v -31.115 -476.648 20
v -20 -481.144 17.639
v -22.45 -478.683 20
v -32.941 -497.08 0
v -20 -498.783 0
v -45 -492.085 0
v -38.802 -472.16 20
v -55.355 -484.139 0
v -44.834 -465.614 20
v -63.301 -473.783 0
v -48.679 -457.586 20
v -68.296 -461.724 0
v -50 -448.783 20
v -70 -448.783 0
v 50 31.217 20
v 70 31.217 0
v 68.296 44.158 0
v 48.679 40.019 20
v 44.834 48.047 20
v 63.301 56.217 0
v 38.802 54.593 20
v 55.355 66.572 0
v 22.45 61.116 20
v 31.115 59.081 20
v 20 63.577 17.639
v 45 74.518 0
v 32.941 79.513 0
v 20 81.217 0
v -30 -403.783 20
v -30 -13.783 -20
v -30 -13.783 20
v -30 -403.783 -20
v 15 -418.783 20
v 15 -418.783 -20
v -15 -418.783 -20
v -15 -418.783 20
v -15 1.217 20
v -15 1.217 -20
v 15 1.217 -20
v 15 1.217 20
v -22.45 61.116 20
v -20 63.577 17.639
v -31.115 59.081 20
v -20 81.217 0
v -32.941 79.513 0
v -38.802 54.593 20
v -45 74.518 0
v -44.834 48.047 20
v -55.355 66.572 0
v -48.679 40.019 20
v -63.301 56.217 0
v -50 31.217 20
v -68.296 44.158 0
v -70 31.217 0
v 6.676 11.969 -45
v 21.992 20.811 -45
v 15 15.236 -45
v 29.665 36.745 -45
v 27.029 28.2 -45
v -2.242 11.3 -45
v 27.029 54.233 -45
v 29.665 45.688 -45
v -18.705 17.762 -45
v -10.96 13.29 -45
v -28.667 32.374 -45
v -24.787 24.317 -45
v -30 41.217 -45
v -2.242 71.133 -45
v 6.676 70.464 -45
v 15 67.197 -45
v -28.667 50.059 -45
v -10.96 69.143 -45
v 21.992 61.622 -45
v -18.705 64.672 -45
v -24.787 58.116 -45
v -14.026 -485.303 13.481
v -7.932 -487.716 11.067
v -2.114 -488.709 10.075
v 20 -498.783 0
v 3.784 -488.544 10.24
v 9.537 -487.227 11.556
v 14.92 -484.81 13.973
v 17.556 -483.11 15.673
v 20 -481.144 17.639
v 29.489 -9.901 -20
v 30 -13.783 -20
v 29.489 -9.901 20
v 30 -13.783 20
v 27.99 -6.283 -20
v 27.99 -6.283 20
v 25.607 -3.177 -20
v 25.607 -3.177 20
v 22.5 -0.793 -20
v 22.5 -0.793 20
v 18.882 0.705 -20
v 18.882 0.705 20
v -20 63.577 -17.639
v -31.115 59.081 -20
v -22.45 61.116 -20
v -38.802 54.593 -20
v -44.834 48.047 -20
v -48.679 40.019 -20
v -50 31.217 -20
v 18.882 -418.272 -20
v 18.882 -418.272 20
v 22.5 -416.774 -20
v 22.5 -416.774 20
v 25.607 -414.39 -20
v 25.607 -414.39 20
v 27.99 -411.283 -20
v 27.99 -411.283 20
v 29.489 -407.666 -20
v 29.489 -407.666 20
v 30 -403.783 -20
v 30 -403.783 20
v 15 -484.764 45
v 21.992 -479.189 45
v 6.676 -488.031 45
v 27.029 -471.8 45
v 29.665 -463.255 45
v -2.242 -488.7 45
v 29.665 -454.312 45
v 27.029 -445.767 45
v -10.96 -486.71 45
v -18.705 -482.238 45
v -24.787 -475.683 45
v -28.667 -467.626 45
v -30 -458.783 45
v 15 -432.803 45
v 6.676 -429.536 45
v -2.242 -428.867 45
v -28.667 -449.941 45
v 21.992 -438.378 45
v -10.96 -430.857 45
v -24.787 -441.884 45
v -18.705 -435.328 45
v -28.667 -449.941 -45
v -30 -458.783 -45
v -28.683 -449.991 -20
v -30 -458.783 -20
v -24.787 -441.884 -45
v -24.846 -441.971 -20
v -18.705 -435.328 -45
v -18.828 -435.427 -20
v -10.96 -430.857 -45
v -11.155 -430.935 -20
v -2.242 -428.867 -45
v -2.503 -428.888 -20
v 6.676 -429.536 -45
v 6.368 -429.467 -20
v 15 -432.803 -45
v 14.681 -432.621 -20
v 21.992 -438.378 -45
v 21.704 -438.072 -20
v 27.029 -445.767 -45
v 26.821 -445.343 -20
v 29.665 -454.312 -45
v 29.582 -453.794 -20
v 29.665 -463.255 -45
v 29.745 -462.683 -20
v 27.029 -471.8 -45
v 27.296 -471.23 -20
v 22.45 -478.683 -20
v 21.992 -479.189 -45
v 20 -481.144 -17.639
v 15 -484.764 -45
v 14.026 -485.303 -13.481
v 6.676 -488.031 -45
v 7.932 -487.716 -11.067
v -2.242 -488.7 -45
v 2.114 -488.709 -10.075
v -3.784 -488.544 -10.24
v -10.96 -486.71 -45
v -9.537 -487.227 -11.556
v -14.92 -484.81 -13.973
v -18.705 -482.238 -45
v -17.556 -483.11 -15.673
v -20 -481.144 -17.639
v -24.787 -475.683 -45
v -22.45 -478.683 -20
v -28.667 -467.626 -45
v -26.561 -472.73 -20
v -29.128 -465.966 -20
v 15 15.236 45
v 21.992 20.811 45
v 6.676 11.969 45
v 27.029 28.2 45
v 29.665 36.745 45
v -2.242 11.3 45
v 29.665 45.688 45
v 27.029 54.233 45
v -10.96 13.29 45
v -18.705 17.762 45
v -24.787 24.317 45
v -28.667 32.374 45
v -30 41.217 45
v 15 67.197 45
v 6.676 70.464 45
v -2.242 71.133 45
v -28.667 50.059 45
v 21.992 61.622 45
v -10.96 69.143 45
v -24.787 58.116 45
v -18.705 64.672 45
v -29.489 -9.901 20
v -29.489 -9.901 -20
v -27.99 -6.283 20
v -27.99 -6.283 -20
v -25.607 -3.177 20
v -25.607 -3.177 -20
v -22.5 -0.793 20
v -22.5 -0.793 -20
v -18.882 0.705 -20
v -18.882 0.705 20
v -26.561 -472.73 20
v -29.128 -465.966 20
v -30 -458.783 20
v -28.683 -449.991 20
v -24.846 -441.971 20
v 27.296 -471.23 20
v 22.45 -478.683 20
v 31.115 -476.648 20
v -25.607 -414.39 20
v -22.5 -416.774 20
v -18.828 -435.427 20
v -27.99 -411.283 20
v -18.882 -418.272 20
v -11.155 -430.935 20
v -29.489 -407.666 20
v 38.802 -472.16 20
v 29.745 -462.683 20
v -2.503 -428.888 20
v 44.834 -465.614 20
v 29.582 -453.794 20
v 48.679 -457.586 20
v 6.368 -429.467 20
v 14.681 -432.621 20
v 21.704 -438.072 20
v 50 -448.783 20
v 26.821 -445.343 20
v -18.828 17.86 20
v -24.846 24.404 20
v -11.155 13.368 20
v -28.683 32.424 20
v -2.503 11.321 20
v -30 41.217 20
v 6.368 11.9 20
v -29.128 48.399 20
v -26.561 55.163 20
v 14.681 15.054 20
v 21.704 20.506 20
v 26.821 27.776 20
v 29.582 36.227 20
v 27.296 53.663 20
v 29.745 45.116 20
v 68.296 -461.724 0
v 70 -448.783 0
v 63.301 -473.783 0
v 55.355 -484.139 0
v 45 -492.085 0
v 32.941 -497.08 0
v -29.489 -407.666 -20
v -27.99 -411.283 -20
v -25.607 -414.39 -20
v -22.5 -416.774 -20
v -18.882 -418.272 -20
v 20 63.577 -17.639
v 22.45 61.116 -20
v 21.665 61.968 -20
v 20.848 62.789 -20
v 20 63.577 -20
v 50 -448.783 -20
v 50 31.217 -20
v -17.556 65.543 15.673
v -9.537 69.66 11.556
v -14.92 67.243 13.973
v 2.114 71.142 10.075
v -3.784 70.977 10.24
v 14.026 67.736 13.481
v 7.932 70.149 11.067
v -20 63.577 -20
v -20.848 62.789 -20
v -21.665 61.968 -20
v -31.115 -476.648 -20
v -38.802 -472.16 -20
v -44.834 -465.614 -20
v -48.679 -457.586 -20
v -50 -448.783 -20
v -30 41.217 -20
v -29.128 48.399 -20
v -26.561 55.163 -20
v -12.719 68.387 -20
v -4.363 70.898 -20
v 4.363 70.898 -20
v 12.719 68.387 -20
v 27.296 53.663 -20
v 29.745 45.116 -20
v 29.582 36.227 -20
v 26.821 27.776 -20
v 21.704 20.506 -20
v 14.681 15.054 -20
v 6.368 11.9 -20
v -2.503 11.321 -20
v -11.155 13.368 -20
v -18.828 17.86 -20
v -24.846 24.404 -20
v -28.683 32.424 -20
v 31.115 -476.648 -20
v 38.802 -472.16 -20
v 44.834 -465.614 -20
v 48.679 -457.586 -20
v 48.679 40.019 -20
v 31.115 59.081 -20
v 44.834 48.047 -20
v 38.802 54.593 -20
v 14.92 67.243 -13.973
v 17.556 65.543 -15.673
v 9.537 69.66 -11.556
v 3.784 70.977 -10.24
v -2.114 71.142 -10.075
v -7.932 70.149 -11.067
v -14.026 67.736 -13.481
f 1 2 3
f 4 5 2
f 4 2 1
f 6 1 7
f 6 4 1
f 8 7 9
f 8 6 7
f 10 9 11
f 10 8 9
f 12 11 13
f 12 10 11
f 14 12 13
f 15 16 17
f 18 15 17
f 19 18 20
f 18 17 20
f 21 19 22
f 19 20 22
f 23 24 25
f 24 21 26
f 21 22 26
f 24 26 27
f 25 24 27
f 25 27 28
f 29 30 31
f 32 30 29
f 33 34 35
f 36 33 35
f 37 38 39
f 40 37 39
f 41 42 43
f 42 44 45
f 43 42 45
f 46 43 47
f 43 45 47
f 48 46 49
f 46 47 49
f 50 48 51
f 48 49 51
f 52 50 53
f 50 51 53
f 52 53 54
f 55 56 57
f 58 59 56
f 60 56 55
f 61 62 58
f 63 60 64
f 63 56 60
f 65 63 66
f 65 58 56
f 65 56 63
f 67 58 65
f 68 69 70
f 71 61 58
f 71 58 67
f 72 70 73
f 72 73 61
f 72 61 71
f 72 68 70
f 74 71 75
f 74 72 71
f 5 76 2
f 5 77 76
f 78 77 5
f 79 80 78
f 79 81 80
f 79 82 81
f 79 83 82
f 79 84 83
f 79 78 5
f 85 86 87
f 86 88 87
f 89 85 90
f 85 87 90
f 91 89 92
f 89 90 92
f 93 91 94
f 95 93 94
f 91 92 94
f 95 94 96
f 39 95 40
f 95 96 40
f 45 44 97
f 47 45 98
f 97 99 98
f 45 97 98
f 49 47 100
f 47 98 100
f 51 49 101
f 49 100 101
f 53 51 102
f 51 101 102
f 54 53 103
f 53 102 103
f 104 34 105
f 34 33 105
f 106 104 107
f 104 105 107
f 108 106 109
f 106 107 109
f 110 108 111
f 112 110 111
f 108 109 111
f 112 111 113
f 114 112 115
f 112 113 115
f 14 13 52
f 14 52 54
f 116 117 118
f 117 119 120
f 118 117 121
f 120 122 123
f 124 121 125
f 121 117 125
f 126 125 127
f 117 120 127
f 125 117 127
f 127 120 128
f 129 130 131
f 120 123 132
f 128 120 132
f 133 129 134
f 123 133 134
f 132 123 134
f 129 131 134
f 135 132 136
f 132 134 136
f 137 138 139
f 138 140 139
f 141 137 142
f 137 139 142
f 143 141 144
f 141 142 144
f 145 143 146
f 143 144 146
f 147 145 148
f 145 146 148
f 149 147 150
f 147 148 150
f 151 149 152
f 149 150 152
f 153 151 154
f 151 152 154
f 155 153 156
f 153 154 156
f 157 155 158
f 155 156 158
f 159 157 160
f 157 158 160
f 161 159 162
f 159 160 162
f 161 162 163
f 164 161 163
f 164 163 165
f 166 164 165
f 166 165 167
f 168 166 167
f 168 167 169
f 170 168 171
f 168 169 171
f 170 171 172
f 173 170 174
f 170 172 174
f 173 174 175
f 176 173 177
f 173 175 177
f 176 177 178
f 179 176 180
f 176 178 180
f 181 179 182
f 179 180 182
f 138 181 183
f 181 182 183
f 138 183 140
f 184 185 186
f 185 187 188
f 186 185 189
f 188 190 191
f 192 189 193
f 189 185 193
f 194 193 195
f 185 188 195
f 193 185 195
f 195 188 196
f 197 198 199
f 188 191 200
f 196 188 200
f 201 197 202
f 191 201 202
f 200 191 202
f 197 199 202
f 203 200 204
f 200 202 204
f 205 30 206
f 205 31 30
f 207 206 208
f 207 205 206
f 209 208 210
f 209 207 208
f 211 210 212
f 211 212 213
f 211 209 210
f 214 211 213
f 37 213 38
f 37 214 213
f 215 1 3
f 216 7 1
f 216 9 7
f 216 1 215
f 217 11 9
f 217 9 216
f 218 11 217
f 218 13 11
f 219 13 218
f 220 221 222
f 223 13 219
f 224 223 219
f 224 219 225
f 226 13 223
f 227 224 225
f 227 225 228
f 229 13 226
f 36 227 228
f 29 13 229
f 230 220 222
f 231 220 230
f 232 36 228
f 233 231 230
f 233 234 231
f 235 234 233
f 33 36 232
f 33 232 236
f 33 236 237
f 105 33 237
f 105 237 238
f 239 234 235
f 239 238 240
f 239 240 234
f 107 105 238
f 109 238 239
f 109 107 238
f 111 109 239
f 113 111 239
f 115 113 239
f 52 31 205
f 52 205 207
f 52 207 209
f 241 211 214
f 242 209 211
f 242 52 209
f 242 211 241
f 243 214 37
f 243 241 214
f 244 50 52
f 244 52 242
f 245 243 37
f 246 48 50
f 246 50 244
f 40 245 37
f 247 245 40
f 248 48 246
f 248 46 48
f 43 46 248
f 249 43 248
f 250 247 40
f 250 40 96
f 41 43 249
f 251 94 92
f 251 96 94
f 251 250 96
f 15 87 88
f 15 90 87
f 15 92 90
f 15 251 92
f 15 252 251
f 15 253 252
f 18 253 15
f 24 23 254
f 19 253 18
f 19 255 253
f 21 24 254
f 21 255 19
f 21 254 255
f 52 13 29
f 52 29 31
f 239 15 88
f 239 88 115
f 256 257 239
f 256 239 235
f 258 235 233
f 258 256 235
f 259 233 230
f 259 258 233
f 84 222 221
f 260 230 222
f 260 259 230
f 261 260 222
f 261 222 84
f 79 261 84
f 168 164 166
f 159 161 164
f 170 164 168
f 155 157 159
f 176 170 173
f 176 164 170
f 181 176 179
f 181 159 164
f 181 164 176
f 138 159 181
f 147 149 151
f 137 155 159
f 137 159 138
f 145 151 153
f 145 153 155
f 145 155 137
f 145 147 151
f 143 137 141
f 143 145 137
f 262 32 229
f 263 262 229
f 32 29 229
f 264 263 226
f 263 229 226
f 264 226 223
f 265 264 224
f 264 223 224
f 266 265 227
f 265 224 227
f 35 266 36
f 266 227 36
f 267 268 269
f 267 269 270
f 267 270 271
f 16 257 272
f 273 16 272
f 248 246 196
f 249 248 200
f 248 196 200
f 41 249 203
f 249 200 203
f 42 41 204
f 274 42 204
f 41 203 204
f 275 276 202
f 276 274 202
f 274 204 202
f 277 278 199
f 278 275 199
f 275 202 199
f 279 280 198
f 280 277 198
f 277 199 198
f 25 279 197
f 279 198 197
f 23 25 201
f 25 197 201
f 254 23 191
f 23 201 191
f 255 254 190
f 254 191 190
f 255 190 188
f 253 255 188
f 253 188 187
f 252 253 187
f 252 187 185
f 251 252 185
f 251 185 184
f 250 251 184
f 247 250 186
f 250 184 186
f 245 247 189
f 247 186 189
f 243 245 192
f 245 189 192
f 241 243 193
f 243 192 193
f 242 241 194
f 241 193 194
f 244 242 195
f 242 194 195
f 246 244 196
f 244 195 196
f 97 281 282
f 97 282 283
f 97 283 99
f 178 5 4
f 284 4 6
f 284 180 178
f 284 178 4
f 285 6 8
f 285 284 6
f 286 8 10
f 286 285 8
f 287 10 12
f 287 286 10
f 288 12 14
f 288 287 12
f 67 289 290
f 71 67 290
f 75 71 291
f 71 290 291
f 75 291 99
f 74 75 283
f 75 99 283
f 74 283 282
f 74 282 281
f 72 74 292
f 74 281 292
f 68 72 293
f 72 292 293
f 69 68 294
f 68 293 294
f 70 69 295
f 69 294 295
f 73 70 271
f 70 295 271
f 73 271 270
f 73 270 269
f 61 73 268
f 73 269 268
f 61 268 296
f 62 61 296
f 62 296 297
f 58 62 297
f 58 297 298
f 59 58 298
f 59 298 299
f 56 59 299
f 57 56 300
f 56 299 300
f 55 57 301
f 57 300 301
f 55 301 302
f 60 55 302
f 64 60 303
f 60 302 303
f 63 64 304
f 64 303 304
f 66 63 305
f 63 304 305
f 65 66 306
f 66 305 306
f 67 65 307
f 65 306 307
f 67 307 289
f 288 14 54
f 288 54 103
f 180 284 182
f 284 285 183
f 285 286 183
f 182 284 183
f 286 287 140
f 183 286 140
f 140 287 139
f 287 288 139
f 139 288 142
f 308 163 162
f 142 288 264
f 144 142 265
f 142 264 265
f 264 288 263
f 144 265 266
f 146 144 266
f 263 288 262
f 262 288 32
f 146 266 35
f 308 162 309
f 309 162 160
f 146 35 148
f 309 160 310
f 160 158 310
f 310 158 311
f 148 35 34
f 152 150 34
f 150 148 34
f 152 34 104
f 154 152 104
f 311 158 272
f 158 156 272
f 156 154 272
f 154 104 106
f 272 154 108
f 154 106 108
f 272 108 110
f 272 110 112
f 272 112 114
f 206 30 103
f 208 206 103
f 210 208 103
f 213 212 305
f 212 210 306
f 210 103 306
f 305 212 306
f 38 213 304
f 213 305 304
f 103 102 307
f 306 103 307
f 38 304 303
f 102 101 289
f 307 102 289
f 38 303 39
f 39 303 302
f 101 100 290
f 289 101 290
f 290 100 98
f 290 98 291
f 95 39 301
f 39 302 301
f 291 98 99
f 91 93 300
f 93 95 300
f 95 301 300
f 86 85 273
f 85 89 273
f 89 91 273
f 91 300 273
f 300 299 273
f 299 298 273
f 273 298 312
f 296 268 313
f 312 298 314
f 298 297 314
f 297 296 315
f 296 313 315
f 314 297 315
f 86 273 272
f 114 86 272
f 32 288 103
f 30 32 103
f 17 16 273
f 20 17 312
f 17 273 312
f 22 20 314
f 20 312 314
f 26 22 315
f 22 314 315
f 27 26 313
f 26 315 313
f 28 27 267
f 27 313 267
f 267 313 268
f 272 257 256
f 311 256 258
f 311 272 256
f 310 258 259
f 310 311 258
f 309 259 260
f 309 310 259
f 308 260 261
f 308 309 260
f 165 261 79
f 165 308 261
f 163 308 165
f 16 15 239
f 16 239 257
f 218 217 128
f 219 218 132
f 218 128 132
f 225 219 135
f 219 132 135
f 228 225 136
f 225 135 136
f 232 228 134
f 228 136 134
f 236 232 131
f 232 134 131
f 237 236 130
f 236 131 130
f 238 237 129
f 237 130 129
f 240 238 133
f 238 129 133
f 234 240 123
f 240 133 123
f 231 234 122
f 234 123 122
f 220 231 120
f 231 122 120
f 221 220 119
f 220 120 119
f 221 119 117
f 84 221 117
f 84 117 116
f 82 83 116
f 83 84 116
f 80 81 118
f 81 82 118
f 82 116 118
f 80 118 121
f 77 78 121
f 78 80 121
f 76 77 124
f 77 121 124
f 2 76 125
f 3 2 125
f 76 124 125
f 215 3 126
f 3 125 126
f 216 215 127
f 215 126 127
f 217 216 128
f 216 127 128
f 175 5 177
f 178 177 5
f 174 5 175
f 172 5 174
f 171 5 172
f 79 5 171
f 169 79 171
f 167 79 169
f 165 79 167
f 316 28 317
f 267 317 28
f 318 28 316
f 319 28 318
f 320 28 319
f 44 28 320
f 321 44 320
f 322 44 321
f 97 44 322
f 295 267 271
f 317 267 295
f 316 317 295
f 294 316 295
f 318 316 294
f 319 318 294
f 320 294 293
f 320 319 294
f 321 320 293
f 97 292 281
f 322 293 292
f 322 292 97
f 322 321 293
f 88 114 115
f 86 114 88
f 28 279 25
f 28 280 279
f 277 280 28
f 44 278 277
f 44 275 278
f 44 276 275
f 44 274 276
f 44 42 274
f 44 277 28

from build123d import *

# Parameters (mm, degrees)
EXTRUDE_1_DEPTH      = 20
EXTRUDE_1_DEPTH_BACK = 20
SKETCH_1_W           = 140
SKETCH_1_H           = 580
SKETCH_1_R           = 30
EXTRUDE_2_DEPTH      = 25
EXTRUDE_2_DEPTH_BACK = 65
SKETCH_3_R           = 30
CUT_EXTRUDE_1_DEPTH  = 40
FILLET_1_R           = 50
FILLET_2_R           = 15
CHAMFER_1_SIZE       = 20


with BuildPart() as part:
    # Эскиз1 → Бобышка-Вытянуть1 (new, two sides: drawn at the far end of the back side and taken through both)
    with BuildSketch(Plane.XY.offset(-EXTRUDE_1_DEPTH_BACK)):
        with Locations((0, -208.783389553)):
            Rectangle(SKETCH_1_W, SKETCH_1_H)
        with Locations((0, 41.216610447)):
            Circle(SKETCH_1_R, mode=Mode.SUBTRACT)
        with Locations((0, -458.783389553)):
            Circle(SKETCH_1_R, mode=Mode.SUBTRACT)
    extrude(amount=EXTRUDE_1_DEPTH + EXTRUDE_1_DEPTH_BACK)

    # Эскиз3 → Бобышка-Вытянуть2 (add, two sides: drawn at the far end of the back side and taken through both)
    with BuildSketch(Plane(origin=(0, 0, -20), x_dir=(-1, 0, 0), z_dir=(0, 0, -1)).offset(-EXTRUDE_2_DEPTH_BACK)):
        with Locations((0, 41.216610447)):
            Circle(SKETCH_3_R)
        with Locations((0, -458.783389553)):
            Circle(SKETCH_3_R)
    extrude(amount=EXTRUDE_2_DEPTH + EXTRUDE_2_DEPTH_BACK)

    # Эскиз4 → Вырез-Вытянуть1 (cut)
    with BuildSketch(Plane(origin=(0, 0, -20), x_dir=(-1, 0, 0), z_dir=(0, 0, -1))):
        Polygon((-30, 1.216610447), (0, 1.216610447), (30, 1.216610447), (30, -418.783389553), (0, -418.783389553), (-30, -418.783389553), align=None)
    extrude(amount=-CUT_EXTRUDE_1_DEPTH, mode=Mode.SUBTRACT)

    # Скругление1
    fillet_1_edges = [part.edges().sort_by_distance(p)[0] for p in [
        (70, -498.783389553, 0),
        (70, 81.216610447, 0),
        (-70, 81.216610447, 0),
        (-70, -498.783389553, 0),
    ]]
    fillet(fillet_1_edges, radius=FILLET_1_R)

    # Скругление2
    fillet_2_edges = [part.edges().sort_by_distance(p)[0] for p in [
        (30, 1.216610447, 0),
        (-30, 1.216610447, 0),
        (-30, -418.783389553, 0),
        (30, -418.783389553, 0),
    ]]
    fillet(fillet_2_edges, radius=FILLET_2_R)

    # Фаска1
    # the kernel refuses this chamfer: 20 mm, written as the material it takes off along each edge
    with BuildSketch(Plane(origin=(20, -498.783389553, -20), x_dir=(0, -0.0274958766105877, 0.9996219169112968), z_dir=(-1, 0, 0))) as chamfer_1_piece_1_section:
        Polygon((CHAMFER_1_SIZE * 0.999621916911, CHAMFER_1_SIZE * 0.0274958766106), (-CHAMFER_1_SIZE * 0.0274958766106, CHAMFER_1_SIZE * 0.999621916911), (0, 0), align=None)
    chamfer_1_piece_1 = extrude(amount=40, mode=Mode.PRIVATE)
    chamfer_1_piece_1 = chamfer_1_piece_1 - Plane(origin=(0, -458.783389553, -12.567480213), x_dir=(-1, 0, 0), z_dir=(0, 0, 1)) * Cylinder(30, 160, mode=Mode.PRIVATE)
    add(chamfer_1_piece_1, mode=Mode.SUBTRACT)
    with BuildSketch(Plane(origin=(-20, -448.783389553, -20), x_dir=(0, -1, 0), z_dir=(1, 0, 0))) as chamfer_1_piece_2_section:
        Polygon((50, -CHAMFER_1_SIZE), (50 - CHAMFER_1_SIZE, 0), (50, 0), align=None)
    chamfer_1_piece_2 = revolve(axis=Axis((-20, -448.783389553, -20), (0, 0, -1)), revolution_arc=90, mode=Mode.PRIVATE)
    chamfer_1_piece_2 = chamfer_1_piece_2 - Plane(origin=(0, -458.783389553, -13.088521936), x_dir=(-1, 0, 0), z_dir=(0, 0, 1)) * Cylinder(30, 200, mode=Mode.PRIVATE)
    add(chamfer_1_piece_2, mode=Mode.SUBTRACT)
    with BuildSketch(Plane(origin=(20, -448.783389553, -20), x_dir=(1, 0, 0), z_dir=(0, 1, 0))) as chamfer_1_piece_3_section:
        Polygon((50, -CHAMFER_1_SIZE), (50 - CHAMFER_1_SIZE, 0), (50, 0), align=None)
    chamfer_1_piece_3 = revolve(axis=Axis((20, -448.783389553, -20), (0, 0, -1)), revolution_arc=90, mode=Mode.PRIVATE)
    chamfer_1_piece_3 = chamfer_1_piece_3 - Plane(origin=(0, -458.783389553, -13.088521936), x_dir=(-1, 0, 0), z_dir=(0, 0, 1)) * Cylinder(30, 200, mode=Mode.PRIVATE)
    add(chamfer_1_piece_3, mode=Mode.SUBTRACT)
    with BuildSketch(Plane(origin=(-70, -448.783389553, -20), x_dir=(-0.027495876610586317, 0, 0.9996219169112968), z_dir=(0, 1, 0)), Plane(origin=(70, 31.216610447, -20), x_dir=(0.027495876610586317, 0, 0.9996219169112968), z_dir=(0, -1, 0)), Plane(origin=(70, 31.216610447, 20), x_dir=(-0.9996219169112968, 0, 0.027495876610586317), z_dir=(0, -1, 0)), Plane(origin=(-70, -448.783389553, 20), x_dir=(0.9996219169112968, 0, 0.027495876610586317), z_dir=(0, 1, 0))) as chamfer_1_piece_4:
        Polygon((CHAMFER_1_SIZE * 0.999621916911, CHAMFER_1_SIZE * 0.0274958766106), (-CHAMFER_1_SIZE * 0.0274958766106, CHAMFER_1_SIZE * 0.999621916911), (0, 0), align=None)
    extrude(amount=480, mode=Mode.SUBTRACT)
    with BuildSketch(Plane(origin=(-20, 31.216610447, -20), x_dir=(0, 1, 0), z_dir=(1, 0, 0))) as chamfer_1_piece_5_section:
        Polygon((50, CHAMFER_1_SIZE), (50 - CHAMFER_1_SIZE, 0), (50, 0), align=None)
    chamfer_1_piece_5 = revolve(axis=Axis((-20, 31.216610447, -20), (0, 0, 1)), revolution_arc=90, mode=Mode.PRIVATE)
    chamfer_1_piece_5 = chamfer_1_piece_5 - Plane(origin=(0, 41.216610447, -13.088521936), x_dir=(-1, 0, 0), z_dir=(0, 0, 1)) * Cylinder(30, 200, mode=Mode.PRIVATE)
    add(chamfer_1_piece_5, mode=Mode.SUBTRACT)
    with BuildSketch(Plane(origin=(20, 31.216610447, -20), x_dir=(1, 0, 0), z_dir=(0, -1, 0))) as chamfer_1_piece_6_section:
        Polygon((50, CHAMFER_1_SIZE), (50 - CHAMFER_1_SIZE, 0), (50, 0), align=None)
    chamfer_1_piece_6 = revolve(axis=Axis((20, 31.216610447, -20), (0, 0, 1)), revolution_arc=90, mode=Mode.PRIVATE)
    chamfer_1_piece_6 = chamfer_1_piece_6 - Plane(origin=(0, 41.216610447, -13.088521936), x_dir=(-1, 0, 0), z_dir=(0, 0, 1)) * Cylinder(30, 200, mode=Mode.PRIVATE)
    add(chamfer_1_piece_6, mode=Mode.SUBTRACT)
    with BuildSketch(Plane(origin=(-20, 81.216610447, -20), x_dir=(0, 0.027495876610586317, 0.9996219169112968), z_dir=(1, 0, 0))) as chamfer_1_piece_7_section:
        Polygon((CHAMFER_1_SIZE * 0.999621916911, CHAMFER_1_SIZE * 0.0274958766106), (-CHAMFER_1_SIZE * 0.0274958766106, CHAMFER_1_SIZE * 0.999621916911), (0, 0), align=None)
    chamfer_1_piece_7 = extrude(amount=40, mode=Mode.PRIVATE)
    chamfer_1_piece_7 = chamfer_1_piece_7 - Plane(origin=(0, 41.216610447, -12.567480213), x_dir=(-1, 0, 0), z_dir=(0, 0, 1)) * Cylinder(30, 160, mode=Mode.PRIVATE)
    add(chamfer_1_piece_7, mode=Mode.SUBTRACT)
    with BuildSketch(Plane(origin=(20, -498.783389553, 20), x_dir=(0, 0.9996219169112968, 0.027495876610586206), z_dir=(-1, 0, 0))) as chamfer_1_piece_8_section:
        Polygon((CHAMFER_1_SIZE * 0.999621916911, CHAMFER_1_SIZE * 0.0274958766106), (-CHAMFER_1_SIZE * 0.0274958766106, CHAMFER_1_SIZE * 0.999621916911), (0, 0), align=None)
    chamfer_1_piece_8 = extrude(amount=40, mode=Mode.PRIVATE)
    chamfer_1_piece_8 = chamfer_1_piece_8 - Plane(origin=(0, -458.783389553, 12.567480585), x_dir=(-1, 0, 0), z_dir=(0, 0, -1)) * Cylinder(30, 160, mode=Mode.PRIVATE)
    add(chamfer_1_piece_8, mode=Mode.SUBTRACT)
    with BuildSketch(Plane(origin=(20, -448.783389553, 20), x_dir=(1, 0, 0), z_dir=(0, 1, 0))) as chamfer_1_piece_9_section:
        Polygon((50 - CHAMFER_1_SIZE, 0), (50, CHAMFER_1_SIZE), (50, 0), align=None)
    chamfer_1_piece_9 = revolve(axis=Axis((20, -448.783389553, 20), (0, 0, -1)), revolution_arc=90, mode=Mode.PRIVATE)
    chamfer_1_piece_9 = chamfer_1_piece_9 - Plane(origin=(0, -458.783389553, 13.088521928), x_dir=(-1, 0, 0), z_dir=(0, 0, -1)) * Cylinder(30, 200, mode=Mode.PRIVATE)
    add(chamfer_1_piece_9, mode=Mode.SUBTRACT)
    with BuildSketch(Plane(origin=(-20, -448.783389553, 20), x_dir=(0, -1, 0), z_dir=(1, 0, 0))) as chamfer_1_piece_10_section:
        Polygon((50 - CHAMFER_1_SIZE, 0), (50, CHAMFER_1_SIZE), (50, 0), align=None)
    chamfer_1_piece_10 = revolve(axis=Axis((-20, -448.783389553, 20), (0, 0, -1)), revolution_arc=90, mode=Mode.PRIVATE)
    chamfer_1_piece_10 = chamfer_1_piece_10 - Plane(origin=(0, -458.783389553, 13.088521939), x_dir=(-1, 0, 0), z_dir=(0, 0, -1)) * Cylinder(30, 200, mode=Mode.PRIVATE)
    add(chamfer_1_piece_10, mode=Mode.SUBTRACT)
    with BuildSketch(Plane(origin=(20, 31.216610447, 20), x_dir=(1, 0, 0), z_dir=(0, -1, 0))) as chamfer_1_piece_11_section:
        Polygon((50 - CHAMFER_1_SIZE, 0), (50, -CHAMFER_1_SIZE), (50, 0), align=None)
    chamfer_1_piece_11 = revolve(axis=Axis((20, 31.216610447, 20), (0, 0, 1)), revolution_arc=90, mode=Mode.PRIVATE)
    chamfer_1_piece_11 = chamfer_1_piece_11 - Plane(origin=(0, 41.216610447, 13.088521931), x_dir=(-1, 0, 0), z_dir=(0, 0, -1)) * Cylinder(30, 200, mode=Mode.PRIVATE)
    add(chamfer_1_piece_11, mode=Mode.SUBTRACT)
    with BuildSketch(Plane(origin=(-20, 31.216610447, 20), x_dir=(0, 1, 0), z_dir=(1, 0, 0))) as chamfer_1_piece_12_section:
        Polygon((50 - CHAMFER_1_SIZE, 0), (50, -CHAMFER_1_SIZE), (50, 0), align=None)
    chamfer_1_piece_12 = revolve(axis=Axis((-20, 31.216610447, 20), (0, 0, 1)), revolution_arc=90, mode=Mode.PRIVATE)
    chamfer_1_piece_12 = chamfer_1_piece_12 - Plane(origin=(0, 41.216610447, 13.088521936), x_dir=(-1, 0, 0), z_dir=(0, 0, -1)) * Cylinder(30, 200, mode=Mode.PRIVATE)
    add(chamfer_1_piece_12, mode=Mode.SUBTRACT)
    with BuildSketch(Plane(origin=(-20, 81.216610447, 20), x_dir=(0, -0.9996219169112968, 0.027495876610586337), z_dir=(1, 0, 0))) as chamfer_1_piece_13_section:
        Polygon((CHAMFER_1_SIZE * 0.999621916911, CHAMFER_1_SIZE * 0.0274958766106), (-CHAMFER_1_SIZE * 0.0274958766106, CHAMFER_1_SIZE * 0.999621916911), (0, 0), align=None)
    chamfer_1_piece_13 = extrude(amount=40, mode=Mode.PRIVATE)
    chamfer_1_piece_13 = chamfer_1_piece_13 - Plane(origin=(0, 41.216610447, 12.567480585), x_dir=(-1, 0, 0), z_dir=(0, 0, -1)) * Cylinder(30, 160, mode=Mode.PRIVATE)
    add(chamfer_1_piece_13, mode=Mode.SUBTRACT)


solid = part.part
